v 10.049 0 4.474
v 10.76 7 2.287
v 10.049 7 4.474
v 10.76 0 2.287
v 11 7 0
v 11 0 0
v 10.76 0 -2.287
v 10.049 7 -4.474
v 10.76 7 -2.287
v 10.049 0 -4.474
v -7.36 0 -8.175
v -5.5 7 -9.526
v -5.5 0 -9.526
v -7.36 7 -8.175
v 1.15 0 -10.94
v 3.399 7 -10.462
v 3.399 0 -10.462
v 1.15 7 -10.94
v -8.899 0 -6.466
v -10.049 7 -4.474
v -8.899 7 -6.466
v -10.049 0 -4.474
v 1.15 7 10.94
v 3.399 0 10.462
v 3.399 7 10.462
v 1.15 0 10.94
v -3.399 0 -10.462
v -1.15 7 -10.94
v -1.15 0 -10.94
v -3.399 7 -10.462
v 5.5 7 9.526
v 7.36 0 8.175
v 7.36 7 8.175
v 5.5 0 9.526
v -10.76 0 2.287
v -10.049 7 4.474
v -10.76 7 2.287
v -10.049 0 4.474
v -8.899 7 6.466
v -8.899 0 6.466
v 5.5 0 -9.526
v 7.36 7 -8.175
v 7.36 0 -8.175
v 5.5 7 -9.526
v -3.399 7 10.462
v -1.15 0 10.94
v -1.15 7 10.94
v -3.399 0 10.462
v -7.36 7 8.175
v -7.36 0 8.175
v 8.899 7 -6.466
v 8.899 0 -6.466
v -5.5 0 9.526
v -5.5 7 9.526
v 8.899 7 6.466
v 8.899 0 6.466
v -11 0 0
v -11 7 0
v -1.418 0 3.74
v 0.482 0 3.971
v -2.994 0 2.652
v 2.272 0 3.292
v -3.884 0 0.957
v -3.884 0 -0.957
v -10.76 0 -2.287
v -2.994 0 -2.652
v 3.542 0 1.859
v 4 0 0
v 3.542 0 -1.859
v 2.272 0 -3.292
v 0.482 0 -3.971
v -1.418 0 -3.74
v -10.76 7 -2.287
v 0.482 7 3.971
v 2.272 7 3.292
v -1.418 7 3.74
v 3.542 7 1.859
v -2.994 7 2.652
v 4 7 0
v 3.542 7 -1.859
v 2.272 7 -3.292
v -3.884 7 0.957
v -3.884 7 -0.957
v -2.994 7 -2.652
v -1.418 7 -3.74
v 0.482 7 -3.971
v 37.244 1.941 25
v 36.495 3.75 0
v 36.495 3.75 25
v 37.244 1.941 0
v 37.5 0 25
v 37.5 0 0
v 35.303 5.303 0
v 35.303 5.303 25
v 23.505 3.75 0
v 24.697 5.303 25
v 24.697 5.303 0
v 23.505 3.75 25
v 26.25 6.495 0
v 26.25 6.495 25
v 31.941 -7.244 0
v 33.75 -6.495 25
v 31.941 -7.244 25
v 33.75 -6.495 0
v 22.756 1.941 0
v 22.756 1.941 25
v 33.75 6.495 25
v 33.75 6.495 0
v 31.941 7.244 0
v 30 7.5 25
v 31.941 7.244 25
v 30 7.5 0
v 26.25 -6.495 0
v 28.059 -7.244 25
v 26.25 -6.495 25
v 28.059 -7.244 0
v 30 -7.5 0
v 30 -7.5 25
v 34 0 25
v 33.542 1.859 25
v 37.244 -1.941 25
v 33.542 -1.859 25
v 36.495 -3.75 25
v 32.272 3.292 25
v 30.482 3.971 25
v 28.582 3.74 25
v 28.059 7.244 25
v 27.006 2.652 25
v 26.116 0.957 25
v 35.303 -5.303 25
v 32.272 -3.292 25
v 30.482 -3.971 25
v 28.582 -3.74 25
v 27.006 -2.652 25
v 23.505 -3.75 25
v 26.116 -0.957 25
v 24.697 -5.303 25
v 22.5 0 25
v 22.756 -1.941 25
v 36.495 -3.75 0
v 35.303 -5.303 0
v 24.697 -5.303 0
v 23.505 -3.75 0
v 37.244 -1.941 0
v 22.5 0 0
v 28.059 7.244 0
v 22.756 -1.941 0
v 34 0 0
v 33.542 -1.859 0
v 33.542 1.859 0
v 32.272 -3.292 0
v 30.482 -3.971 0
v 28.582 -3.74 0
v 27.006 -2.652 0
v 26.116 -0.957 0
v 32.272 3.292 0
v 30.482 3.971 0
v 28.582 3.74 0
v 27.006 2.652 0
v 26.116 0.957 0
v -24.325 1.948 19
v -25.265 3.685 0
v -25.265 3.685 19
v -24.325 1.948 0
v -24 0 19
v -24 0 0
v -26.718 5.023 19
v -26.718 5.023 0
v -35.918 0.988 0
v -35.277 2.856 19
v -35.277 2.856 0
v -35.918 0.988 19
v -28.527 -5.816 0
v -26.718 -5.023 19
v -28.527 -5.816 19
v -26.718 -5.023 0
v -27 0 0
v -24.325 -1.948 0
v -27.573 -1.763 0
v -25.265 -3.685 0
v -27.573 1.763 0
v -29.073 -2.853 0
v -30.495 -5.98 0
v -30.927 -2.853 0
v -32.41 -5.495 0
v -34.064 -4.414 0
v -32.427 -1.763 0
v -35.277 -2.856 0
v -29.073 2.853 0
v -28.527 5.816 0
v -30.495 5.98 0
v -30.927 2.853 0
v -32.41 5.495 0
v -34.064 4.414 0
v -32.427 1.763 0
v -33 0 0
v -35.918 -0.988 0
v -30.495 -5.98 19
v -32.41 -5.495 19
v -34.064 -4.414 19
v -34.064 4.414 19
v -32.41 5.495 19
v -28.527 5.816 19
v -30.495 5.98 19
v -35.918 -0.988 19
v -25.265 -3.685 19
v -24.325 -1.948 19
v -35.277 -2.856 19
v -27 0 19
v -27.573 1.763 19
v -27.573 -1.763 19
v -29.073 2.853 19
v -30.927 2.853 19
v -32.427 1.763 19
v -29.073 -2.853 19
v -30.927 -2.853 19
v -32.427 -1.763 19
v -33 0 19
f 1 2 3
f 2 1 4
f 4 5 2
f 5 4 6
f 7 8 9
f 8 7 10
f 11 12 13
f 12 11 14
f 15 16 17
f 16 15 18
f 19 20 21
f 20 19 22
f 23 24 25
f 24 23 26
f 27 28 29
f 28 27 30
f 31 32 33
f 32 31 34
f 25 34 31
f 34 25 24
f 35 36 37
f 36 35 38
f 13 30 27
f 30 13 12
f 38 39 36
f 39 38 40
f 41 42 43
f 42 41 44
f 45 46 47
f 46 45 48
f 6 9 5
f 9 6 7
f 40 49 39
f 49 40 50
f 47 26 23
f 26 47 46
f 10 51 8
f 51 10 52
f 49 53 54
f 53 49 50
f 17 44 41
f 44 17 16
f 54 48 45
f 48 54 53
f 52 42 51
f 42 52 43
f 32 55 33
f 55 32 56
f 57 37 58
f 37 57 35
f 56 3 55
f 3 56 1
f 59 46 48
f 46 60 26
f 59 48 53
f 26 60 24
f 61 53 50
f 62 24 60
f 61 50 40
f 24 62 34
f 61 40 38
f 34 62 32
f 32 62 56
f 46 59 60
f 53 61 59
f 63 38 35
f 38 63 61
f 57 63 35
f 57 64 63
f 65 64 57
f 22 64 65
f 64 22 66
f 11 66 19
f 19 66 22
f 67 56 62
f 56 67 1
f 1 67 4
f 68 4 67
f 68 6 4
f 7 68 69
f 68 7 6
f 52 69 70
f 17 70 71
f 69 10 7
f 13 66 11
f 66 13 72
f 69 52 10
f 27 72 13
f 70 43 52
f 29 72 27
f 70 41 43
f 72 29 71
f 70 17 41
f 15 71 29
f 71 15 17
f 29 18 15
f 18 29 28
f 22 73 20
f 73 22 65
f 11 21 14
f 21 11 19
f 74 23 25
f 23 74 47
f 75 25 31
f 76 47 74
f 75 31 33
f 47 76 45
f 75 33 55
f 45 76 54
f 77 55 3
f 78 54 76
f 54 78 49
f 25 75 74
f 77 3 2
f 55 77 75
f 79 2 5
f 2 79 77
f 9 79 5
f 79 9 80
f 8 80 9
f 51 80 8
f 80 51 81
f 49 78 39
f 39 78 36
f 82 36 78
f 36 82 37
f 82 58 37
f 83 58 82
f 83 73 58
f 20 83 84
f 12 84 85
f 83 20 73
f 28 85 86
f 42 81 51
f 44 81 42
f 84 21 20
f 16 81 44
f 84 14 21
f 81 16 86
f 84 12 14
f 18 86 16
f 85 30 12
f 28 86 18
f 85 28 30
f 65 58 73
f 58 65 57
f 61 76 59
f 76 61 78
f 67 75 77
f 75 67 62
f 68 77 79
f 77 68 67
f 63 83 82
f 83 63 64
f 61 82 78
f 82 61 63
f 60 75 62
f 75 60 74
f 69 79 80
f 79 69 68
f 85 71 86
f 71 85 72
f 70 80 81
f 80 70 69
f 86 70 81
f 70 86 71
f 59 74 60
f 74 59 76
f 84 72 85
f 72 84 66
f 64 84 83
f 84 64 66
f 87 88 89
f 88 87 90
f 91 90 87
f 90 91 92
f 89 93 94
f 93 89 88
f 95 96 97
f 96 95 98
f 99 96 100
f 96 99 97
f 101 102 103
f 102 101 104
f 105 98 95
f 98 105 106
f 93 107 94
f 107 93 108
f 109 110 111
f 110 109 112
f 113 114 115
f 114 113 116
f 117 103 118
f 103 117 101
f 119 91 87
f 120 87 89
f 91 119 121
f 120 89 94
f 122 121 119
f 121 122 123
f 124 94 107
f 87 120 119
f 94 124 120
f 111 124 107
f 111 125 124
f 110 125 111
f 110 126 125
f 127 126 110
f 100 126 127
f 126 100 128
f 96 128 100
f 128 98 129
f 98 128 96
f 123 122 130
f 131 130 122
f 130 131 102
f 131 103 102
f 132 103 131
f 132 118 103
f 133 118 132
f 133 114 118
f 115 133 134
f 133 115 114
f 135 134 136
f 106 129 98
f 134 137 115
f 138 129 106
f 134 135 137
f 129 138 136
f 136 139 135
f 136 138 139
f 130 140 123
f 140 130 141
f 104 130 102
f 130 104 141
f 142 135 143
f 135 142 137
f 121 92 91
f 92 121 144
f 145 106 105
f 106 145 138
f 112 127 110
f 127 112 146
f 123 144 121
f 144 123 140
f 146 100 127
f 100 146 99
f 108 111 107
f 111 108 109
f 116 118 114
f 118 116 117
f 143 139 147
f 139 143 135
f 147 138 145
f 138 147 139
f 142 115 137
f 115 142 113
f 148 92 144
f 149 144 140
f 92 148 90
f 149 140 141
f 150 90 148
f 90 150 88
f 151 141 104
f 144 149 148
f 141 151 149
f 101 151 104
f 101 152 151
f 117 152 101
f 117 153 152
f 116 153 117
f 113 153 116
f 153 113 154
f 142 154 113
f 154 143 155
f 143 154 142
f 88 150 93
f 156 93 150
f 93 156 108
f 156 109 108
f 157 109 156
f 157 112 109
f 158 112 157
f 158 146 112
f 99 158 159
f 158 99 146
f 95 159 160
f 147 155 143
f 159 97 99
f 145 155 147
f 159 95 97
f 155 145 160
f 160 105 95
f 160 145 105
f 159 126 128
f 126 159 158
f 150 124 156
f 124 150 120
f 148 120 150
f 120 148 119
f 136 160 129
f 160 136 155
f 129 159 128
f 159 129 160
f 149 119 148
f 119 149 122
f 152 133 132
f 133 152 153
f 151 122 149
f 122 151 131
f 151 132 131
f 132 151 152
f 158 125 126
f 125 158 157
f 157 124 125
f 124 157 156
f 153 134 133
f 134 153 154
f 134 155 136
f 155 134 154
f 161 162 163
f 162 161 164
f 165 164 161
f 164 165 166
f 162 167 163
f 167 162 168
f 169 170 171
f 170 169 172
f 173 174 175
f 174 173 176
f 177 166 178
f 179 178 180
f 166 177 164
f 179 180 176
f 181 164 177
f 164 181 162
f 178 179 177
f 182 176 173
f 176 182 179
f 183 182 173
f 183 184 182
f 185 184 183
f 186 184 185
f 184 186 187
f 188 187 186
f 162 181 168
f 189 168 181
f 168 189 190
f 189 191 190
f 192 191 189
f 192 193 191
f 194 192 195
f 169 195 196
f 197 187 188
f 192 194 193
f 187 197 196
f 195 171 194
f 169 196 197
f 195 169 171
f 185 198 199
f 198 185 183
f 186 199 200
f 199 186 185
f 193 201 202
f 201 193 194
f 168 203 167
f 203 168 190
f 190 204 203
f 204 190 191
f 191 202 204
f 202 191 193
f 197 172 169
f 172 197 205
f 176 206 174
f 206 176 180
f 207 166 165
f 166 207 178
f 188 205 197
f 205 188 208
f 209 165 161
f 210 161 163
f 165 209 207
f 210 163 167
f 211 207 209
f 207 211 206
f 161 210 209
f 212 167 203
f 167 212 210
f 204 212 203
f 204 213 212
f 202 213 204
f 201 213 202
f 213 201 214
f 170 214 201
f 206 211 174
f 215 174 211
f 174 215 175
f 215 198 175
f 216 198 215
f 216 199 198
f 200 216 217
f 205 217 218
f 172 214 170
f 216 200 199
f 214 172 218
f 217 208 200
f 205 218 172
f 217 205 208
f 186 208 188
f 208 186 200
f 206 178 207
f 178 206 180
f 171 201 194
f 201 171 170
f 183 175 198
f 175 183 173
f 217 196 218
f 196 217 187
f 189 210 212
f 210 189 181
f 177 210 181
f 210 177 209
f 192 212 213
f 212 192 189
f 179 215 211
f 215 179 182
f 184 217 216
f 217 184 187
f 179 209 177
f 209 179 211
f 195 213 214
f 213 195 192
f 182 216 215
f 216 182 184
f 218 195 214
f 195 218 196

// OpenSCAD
steel = [0.8, 0.8, 0.9];

module bearing(id, od, w) {
    translate([0,w/2,0])
    color(steel) 
    render()
    rotate([90, 0, 0]) difference() {
		cylinder(h=w, r=od/2, center=true);
		cylinder(h=w*2, r=id/2, center=true);
    }
}

bearing(8, 22, 7); // 608 skateboard ball bearing.

module lm8uu() {
    translate([0,0,25/2])
    color(steel) render() difference() {
        cylinder(h=25, r=7.5, center=true);
        cylinder(h=30, r=4, center=true);
    }
}

translate([30, 0, 0]) lm8uu(); // Linear bearing for 8mm smooth rod.

module lm6uu() {
    translate([0,0,19/2])
    color(steel) render() difference() {
        cylinder(h=19, r=6, center=true);
        cylinder(h=30, r=3, center=true);
    }
}


translate([-30, 0, 0]) lm6uu();
